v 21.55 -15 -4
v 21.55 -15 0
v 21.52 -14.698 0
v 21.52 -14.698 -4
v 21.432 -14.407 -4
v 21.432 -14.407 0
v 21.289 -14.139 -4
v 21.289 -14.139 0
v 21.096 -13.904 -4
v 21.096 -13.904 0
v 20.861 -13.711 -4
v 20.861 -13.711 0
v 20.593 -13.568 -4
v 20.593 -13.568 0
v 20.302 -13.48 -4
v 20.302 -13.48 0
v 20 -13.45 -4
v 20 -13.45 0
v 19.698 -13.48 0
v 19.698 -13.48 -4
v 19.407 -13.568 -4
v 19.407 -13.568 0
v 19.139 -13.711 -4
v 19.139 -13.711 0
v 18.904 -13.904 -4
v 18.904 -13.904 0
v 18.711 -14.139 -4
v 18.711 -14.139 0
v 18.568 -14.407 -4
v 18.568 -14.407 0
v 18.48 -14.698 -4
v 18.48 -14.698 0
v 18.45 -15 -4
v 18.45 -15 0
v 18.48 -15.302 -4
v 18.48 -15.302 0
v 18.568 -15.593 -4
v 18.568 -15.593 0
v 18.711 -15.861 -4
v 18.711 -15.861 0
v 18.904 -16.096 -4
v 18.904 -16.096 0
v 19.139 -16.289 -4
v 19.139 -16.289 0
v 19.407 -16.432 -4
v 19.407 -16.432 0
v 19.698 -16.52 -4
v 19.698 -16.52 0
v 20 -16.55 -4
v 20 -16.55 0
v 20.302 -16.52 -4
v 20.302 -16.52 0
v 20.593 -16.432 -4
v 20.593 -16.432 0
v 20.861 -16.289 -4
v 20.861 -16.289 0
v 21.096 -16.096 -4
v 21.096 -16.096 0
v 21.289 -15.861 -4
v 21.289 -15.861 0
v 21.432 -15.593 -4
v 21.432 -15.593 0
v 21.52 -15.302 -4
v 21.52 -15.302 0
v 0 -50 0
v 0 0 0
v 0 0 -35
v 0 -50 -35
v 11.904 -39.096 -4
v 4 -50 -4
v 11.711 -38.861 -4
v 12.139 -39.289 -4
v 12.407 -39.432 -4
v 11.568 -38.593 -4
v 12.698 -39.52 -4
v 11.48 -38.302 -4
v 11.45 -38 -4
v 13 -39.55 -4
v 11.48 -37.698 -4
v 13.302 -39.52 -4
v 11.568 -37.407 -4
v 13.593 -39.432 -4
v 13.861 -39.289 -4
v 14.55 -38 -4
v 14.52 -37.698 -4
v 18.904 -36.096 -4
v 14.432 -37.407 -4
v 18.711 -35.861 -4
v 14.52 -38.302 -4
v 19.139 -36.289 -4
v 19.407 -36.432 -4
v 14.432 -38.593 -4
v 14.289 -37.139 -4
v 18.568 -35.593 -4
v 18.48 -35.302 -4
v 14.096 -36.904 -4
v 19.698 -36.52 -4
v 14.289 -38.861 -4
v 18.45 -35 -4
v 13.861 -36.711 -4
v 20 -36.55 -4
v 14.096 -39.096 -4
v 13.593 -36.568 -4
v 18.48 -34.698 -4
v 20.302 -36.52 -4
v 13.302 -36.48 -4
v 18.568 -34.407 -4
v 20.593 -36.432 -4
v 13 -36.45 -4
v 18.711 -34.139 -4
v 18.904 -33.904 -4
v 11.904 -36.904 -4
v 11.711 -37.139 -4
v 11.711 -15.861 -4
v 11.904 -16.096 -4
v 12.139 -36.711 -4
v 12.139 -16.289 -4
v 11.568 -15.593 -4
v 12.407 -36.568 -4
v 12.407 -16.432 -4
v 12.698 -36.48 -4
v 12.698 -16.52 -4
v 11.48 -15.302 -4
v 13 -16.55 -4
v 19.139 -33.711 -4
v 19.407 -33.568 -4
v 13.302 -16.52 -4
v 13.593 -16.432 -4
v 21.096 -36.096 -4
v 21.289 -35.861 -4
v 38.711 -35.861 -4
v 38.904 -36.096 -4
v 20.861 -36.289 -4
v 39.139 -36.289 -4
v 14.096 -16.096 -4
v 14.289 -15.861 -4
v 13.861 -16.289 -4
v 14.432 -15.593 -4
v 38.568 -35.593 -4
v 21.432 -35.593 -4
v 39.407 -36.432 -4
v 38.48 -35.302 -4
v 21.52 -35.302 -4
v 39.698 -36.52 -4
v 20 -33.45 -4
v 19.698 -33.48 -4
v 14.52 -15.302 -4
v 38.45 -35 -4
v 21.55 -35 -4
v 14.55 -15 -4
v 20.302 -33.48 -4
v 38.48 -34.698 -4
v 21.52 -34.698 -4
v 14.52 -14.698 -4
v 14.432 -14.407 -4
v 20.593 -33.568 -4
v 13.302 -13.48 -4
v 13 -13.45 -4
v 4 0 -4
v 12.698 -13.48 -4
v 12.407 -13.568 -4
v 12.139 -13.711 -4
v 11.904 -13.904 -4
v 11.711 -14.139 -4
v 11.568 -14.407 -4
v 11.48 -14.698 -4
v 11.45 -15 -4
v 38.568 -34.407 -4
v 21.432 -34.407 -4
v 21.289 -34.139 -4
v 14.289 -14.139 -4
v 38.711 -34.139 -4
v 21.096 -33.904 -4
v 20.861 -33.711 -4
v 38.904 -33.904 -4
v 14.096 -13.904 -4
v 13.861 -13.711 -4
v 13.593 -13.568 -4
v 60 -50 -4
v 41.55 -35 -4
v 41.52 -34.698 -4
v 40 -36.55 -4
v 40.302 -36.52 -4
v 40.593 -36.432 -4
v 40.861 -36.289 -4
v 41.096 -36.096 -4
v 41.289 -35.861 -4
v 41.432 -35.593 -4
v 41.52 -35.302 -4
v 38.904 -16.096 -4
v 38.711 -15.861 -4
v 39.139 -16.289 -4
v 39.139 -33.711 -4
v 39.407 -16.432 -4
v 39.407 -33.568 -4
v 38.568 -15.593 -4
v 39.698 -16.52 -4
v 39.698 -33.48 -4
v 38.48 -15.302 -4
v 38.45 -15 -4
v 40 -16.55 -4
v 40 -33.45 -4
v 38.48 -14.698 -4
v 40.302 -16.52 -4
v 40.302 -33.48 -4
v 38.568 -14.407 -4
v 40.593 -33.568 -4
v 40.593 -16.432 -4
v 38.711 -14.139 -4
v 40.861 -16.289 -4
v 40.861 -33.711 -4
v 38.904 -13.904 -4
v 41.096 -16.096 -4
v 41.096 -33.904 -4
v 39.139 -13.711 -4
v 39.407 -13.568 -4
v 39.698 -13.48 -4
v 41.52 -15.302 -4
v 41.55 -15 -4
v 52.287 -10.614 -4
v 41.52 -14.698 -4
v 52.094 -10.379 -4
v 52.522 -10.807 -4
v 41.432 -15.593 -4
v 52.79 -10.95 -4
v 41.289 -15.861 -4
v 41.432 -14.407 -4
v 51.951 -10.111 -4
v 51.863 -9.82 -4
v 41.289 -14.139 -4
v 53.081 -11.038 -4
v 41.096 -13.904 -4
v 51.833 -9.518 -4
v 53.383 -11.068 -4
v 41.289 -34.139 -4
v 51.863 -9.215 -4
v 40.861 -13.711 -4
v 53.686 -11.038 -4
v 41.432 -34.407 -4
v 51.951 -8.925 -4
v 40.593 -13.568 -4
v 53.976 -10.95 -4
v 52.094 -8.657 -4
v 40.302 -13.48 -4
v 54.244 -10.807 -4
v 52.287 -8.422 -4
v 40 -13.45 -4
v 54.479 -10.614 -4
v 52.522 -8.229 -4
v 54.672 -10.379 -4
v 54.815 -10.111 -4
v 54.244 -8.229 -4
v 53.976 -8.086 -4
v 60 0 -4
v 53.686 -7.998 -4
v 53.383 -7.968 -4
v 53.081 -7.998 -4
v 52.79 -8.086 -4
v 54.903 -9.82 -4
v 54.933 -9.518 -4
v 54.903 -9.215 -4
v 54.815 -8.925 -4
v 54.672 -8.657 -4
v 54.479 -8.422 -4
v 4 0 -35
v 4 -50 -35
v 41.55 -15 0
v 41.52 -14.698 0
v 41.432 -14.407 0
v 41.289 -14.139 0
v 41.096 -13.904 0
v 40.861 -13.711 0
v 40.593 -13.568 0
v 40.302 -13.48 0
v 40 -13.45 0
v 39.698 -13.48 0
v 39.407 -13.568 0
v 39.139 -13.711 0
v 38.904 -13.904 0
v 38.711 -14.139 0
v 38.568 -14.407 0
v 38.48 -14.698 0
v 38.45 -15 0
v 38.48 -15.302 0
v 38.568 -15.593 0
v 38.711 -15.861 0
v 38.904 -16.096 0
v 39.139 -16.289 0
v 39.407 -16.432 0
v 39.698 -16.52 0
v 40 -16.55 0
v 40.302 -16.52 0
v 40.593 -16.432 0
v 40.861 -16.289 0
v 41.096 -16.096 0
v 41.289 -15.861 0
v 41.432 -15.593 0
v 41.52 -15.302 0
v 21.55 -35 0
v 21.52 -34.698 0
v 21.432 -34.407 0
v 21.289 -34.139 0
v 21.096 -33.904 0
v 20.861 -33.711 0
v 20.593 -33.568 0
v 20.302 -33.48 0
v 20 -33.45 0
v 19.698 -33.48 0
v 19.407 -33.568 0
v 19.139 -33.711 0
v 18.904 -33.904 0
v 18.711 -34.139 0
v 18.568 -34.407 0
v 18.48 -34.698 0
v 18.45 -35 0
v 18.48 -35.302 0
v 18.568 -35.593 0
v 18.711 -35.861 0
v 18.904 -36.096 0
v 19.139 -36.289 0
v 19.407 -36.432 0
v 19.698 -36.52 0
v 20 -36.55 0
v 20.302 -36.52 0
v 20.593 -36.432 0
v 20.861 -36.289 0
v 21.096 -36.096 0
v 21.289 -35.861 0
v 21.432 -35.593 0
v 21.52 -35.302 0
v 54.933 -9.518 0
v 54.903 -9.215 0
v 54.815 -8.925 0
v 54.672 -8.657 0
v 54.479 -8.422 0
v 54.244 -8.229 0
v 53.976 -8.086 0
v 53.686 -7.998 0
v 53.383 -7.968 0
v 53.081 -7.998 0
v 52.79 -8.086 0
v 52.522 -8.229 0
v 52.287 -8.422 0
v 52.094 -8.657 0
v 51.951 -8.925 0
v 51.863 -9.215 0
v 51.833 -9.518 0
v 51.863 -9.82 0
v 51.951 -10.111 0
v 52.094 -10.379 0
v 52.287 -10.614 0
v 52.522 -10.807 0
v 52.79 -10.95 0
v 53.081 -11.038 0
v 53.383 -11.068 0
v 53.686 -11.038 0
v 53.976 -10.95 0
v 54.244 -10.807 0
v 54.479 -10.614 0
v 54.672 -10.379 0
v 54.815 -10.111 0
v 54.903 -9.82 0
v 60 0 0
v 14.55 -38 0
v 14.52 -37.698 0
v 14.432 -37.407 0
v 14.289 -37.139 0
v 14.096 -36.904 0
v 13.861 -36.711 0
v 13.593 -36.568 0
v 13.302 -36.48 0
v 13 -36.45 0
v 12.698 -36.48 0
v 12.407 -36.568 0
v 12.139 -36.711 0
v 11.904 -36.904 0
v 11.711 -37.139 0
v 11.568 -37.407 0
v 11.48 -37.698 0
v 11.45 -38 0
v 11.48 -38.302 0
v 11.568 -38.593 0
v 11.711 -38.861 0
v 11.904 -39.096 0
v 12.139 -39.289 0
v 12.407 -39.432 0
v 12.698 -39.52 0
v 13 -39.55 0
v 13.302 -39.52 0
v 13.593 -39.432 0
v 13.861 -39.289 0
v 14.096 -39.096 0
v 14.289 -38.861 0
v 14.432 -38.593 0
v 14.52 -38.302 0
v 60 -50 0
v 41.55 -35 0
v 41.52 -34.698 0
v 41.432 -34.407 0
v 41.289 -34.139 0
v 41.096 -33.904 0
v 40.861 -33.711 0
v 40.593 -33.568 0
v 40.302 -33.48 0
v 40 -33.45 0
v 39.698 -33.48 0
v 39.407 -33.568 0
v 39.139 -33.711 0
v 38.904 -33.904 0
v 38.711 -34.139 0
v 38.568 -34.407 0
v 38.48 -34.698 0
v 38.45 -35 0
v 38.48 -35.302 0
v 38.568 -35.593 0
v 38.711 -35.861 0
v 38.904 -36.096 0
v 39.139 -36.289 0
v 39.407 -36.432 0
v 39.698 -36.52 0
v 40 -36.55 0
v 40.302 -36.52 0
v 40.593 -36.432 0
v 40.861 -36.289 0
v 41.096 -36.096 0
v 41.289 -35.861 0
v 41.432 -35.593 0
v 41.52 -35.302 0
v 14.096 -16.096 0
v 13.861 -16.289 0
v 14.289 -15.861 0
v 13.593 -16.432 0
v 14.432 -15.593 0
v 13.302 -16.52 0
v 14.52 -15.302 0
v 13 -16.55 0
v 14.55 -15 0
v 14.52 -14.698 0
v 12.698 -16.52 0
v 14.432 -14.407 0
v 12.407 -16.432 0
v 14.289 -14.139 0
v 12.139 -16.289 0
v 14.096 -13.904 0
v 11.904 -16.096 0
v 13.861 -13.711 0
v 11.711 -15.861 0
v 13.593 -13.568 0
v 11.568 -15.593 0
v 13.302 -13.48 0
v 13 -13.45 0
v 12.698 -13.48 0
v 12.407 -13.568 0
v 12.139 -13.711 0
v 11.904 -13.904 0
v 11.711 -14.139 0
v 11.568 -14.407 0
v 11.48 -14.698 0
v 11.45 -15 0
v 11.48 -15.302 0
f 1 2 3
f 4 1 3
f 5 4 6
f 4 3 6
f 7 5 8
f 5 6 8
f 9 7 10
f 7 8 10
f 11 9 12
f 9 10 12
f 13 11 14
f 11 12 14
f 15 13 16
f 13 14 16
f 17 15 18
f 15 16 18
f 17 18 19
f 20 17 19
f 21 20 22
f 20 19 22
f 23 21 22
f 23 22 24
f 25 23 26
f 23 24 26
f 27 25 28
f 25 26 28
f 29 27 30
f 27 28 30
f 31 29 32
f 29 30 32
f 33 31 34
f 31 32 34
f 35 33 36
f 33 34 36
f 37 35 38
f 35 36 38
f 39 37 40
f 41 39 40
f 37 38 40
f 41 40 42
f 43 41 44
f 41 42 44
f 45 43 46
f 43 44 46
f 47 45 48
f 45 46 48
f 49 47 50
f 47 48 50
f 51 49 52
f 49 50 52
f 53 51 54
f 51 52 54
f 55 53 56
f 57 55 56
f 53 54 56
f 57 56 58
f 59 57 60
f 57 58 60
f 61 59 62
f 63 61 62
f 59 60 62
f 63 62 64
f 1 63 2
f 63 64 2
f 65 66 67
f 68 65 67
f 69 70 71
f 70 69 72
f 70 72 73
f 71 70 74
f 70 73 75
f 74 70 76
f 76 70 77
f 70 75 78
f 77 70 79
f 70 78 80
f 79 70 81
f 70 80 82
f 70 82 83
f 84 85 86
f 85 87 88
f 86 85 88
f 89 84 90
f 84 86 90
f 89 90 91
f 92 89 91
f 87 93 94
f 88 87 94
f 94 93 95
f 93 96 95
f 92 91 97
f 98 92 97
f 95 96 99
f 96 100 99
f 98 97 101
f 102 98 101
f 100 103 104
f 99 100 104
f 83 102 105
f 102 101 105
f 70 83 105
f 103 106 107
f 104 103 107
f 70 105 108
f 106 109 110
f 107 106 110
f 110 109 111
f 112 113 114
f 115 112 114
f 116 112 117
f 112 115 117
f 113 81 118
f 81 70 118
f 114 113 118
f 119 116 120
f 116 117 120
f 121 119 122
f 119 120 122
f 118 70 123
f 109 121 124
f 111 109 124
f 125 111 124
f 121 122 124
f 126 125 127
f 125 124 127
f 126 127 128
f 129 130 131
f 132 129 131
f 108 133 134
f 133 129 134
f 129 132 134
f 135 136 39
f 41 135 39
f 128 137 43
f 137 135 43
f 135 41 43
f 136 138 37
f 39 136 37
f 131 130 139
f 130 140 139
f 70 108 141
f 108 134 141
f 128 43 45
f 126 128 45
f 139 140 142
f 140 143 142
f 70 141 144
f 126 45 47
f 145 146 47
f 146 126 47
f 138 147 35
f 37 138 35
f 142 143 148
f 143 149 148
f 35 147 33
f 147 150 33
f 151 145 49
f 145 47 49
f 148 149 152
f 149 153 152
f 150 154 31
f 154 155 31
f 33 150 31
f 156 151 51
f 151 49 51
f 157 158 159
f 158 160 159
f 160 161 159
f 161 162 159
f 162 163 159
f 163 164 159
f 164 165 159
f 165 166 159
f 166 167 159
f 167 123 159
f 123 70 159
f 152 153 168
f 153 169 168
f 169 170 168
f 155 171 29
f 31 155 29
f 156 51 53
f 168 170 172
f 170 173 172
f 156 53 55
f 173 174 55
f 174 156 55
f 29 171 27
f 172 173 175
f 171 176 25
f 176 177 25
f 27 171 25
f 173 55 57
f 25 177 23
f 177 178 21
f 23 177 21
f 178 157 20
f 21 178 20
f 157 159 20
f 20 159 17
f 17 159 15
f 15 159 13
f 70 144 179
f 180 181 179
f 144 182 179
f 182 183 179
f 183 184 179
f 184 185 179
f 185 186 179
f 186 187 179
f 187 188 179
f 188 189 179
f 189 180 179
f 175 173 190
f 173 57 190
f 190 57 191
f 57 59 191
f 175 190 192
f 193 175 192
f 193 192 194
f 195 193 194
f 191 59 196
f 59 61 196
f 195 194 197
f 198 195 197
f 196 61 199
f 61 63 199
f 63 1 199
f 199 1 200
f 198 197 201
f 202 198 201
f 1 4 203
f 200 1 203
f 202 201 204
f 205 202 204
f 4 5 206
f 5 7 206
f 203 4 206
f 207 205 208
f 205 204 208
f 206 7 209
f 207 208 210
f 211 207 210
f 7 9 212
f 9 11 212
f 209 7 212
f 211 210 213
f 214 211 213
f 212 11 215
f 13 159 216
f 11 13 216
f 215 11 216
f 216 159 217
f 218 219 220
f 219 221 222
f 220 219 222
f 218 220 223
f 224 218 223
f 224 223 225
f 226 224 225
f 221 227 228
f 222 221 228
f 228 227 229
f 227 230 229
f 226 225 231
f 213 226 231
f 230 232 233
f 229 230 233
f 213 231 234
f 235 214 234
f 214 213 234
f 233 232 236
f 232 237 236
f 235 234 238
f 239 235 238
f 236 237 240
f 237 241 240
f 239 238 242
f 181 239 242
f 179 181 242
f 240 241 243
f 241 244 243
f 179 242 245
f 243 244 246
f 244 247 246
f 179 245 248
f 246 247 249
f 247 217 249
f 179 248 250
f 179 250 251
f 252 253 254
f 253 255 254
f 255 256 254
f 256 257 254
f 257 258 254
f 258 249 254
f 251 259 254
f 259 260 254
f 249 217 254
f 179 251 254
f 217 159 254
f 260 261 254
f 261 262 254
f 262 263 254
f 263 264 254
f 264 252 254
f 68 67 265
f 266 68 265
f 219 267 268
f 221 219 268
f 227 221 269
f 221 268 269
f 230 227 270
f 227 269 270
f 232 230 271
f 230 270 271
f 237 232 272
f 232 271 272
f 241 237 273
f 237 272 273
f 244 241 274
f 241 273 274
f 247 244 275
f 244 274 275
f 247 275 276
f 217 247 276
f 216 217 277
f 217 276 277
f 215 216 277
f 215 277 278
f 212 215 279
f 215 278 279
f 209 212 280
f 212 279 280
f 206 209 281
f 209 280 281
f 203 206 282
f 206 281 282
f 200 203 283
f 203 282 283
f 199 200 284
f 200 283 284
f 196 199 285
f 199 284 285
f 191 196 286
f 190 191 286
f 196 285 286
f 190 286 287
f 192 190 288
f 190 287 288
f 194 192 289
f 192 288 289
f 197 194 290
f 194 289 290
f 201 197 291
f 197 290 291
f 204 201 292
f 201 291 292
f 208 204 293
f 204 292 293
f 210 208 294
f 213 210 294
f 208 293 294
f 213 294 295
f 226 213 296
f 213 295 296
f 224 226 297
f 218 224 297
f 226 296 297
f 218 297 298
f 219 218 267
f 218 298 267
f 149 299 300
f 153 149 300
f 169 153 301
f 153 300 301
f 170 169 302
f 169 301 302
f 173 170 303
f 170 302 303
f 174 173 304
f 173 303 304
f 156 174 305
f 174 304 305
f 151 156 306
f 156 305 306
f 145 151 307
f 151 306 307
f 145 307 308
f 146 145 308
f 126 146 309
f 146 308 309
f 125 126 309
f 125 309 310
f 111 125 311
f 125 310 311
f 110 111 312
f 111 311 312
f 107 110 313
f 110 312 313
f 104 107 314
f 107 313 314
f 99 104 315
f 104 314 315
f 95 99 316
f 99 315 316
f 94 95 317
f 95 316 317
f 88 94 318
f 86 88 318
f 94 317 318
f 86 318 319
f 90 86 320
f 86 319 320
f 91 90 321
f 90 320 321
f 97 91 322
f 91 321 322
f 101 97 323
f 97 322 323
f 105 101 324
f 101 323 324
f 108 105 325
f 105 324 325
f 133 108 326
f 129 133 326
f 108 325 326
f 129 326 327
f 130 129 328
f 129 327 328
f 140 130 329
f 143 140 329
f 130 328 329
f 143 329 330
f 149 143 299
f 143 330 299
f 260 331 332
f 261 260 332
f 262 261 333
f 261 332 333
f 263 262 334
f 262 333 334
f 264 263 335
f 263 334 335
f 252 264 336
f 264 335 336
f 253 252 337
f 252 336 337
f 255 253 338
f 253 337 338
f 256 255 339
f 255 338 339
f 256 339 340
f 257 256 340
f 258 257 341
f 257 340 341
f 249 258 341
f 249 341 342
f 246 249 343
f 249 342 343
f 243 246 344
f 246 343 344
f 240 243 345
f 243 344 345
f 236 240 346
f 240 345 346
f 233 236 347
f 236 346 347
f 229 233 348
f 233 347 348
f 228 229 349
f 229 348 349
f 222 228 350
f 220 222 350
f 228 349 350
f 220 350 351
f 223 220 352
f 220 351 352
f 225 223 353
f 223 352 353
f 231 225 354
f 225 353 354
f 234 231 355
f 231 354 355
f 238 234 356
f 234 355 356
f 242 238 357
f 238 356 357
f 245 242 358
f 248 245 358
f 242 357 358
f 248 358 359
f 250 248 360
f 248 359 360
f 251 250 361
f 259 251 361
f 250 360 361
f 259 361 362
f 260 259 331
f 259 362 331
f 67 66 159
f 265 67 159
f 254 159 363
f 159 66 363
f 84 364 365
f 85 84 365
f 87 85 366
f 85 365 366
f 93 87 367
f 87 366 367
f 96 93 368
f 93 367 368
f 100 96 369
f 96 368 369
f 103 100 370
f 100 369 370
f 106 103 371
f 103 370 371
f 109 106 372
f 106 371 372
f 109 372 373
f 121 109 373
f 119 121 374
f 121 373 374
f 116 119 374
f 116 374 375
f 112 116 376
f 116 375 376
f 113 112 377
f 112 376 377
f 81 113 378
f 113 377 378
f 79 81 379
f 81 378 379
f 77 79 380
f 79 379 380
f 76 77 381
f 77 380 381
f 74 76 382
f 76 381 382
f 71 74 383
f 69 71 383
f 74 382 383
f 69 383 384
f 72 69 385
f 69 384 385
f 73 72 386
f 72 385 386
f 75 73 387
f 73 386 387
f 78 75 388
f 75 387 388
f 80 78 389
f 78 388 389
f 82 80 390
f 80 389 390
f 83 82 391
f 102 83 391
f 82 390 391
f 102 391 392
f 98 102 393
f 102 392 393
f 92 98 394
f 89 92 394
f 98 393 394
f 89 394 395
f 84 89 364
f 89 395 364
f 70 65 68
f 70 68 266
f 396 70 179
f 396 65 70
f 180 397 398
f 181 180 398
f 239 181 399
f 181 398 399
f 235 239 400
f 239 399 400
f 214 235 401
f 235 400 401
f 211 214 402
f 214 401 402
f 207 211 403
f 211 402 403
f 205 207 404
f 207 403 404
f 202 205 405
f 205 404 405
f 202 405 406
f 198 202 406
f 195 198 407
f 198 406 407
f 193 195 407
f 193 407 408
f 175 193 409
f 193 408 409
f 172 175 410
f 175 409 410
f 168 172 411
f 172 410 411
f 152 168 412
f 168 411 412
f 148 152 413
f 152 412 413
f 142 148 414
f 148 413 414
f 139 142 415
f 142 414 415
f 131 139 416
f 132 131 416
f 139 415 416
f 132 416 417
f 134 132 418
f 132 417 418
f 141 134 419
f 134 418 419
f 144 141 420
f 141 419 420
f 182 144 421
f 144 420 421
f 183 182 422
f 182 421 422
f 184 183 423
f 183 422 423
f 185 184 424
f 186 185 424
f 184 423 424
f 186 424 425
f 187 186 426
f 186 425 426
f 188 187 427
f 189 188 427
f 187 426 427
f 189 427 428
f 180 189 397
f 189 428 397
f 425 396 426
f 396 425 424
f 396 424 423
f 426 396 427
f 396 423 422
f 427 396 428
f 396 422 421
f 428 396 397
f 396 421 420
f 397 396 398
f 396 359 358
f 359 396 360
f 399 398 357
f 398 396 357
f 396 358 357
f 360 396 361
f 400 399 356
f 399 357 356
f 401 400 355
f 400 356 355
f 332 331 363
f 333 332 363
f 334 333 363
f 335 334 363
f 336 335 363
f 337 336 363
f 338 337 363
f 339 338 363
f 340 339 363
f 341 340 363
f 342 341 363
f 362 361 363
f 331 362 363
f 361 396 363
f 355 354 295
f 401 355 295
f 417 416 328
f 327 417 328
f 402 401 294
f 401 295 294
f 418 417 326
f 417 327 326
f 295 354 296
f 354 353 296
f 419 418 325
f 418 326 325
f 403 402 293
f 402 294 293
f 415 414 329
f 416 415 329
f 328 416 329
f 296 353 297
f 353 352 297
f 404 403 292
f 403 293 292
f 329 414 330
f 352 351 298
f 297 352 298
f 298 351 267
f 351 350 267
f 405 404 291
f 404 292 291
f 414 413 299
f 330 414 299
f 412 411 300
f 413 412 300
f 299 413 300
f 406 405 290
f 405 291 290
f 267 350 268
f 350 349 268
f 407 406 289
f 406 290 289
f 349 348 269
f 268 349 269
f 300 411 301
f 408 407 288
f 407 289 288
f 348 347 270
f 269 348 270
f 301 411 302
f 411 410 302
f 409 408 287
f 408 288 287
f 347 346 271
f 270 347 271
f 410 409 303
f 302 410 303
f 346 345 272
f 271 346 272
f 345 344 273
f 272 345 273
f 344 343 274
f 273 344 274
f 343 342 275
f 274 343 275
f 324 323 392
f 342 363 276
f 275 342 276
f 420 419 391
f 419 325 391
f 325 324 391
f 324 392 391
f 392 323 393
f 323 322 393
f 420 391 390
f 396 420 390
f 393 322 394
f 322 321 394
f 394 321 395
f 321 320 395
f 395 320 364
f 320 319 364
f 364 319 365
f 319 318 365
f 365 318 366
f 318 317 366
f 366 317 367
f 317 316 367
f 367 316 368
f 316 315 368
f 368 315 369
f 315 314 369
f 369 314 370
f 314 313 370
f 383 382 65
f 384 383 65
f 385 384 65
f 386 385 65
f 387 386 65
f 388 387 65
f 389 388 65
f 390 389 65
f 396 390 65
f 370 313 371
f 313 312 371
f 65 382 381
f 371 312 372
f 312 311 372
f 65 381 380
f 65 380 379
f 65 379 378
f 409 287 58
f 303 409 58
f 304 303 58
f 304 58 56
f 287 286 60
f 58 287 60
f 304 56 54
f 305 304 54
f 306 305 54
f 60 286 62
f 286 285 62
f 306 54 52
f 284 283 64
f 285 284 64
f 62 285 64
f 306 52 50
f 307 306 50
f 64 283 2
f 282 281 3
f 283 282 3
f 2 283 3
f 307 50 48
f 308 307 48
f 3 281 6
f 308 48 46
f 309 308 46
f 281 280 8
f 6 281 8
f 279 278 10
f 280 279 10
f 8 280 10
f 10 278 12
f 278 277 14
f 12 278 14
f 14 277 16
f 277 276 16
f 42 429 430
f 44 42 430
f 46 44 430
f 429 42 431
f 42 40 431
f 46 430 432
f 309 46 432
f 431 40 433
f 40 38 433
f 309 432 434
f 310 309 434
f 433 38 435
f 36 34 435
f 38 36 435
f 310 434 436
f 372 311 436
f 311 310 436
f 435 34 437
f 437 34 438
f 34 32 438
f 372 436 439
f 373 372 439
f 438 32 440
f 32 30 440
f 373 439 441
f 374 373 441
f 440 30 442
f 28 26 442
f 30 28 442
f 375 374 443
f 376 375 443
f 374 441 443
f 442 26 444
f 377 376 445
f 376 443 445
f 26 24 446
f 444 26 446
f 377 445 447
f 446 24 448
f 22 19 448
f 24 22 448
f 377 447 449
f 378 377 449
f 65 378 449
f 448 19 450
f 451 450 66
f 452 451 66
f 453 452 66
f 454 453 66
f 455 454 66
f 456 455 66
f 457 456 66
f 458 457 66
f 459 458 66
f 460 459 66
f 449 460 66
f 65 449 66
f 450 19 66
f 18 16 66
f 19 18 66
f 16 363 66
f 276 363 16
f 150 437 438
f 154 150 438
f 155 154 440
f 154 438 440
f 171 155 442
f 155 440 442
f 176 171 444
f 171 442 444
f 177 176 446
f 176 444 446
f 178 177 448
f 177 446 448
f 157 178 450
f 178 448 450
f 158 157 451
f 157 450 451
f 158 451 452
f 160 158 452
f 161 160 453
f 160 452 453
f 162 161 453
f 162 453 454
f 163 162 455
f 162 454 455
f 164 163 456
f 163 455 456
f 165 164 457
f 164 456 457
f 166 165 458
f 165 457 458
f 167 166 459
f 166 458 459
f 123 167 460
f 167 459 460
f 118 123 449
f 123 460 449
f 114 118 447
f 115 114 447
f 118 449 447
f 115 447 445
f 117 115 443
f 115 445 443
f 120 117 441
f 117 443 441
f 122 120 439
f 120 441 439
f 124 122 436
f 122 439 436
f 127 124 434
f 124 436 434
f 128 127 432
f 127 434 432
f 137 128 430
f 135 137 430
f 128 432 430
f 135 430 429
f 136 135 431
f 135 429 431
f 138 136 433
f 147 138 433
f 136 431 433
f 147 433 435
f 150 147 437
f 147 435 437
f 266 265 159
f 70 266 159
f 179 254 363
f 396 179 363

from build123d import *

# Parameters (mm, degrees)
F1_DEPTH = 50
F2_R     = 1.55
F3_DEPTH = 4


with BuildPart() as f1:
    # F0 (on Front) → F1 (new body)
    with BuildSketch(Plane.XZ):
        Polygon((60, 0), (0, 0), (0, -35), (4, -35), (4, -4), (60, -4), align=None)
    extrude(amount=F1_DEPTH)

    # F2 (on face) → F3 (cut, through all)
    with BuildSketch(Plane.XY):
        with Locations((40, -15)):
            Circle(F2_R)
        with Locations((20, -15)):
            Circle(F2_R)
        with Locations((20, -35)):
            Circle(F2_R)
        with Locations((40, -35)):
            Circle(F2_R)
        with Locations((13, -38)):
            Circle(F2_R)
        with Locations((13, -15)):
            Circle(F2_R)
        with Locations((53.38319, -9.517766)):
            Circle(F2_R)
    extrude(amount=-F3_DEPTH, mode=Mode.SUBTRACT)


solid = f1.part
